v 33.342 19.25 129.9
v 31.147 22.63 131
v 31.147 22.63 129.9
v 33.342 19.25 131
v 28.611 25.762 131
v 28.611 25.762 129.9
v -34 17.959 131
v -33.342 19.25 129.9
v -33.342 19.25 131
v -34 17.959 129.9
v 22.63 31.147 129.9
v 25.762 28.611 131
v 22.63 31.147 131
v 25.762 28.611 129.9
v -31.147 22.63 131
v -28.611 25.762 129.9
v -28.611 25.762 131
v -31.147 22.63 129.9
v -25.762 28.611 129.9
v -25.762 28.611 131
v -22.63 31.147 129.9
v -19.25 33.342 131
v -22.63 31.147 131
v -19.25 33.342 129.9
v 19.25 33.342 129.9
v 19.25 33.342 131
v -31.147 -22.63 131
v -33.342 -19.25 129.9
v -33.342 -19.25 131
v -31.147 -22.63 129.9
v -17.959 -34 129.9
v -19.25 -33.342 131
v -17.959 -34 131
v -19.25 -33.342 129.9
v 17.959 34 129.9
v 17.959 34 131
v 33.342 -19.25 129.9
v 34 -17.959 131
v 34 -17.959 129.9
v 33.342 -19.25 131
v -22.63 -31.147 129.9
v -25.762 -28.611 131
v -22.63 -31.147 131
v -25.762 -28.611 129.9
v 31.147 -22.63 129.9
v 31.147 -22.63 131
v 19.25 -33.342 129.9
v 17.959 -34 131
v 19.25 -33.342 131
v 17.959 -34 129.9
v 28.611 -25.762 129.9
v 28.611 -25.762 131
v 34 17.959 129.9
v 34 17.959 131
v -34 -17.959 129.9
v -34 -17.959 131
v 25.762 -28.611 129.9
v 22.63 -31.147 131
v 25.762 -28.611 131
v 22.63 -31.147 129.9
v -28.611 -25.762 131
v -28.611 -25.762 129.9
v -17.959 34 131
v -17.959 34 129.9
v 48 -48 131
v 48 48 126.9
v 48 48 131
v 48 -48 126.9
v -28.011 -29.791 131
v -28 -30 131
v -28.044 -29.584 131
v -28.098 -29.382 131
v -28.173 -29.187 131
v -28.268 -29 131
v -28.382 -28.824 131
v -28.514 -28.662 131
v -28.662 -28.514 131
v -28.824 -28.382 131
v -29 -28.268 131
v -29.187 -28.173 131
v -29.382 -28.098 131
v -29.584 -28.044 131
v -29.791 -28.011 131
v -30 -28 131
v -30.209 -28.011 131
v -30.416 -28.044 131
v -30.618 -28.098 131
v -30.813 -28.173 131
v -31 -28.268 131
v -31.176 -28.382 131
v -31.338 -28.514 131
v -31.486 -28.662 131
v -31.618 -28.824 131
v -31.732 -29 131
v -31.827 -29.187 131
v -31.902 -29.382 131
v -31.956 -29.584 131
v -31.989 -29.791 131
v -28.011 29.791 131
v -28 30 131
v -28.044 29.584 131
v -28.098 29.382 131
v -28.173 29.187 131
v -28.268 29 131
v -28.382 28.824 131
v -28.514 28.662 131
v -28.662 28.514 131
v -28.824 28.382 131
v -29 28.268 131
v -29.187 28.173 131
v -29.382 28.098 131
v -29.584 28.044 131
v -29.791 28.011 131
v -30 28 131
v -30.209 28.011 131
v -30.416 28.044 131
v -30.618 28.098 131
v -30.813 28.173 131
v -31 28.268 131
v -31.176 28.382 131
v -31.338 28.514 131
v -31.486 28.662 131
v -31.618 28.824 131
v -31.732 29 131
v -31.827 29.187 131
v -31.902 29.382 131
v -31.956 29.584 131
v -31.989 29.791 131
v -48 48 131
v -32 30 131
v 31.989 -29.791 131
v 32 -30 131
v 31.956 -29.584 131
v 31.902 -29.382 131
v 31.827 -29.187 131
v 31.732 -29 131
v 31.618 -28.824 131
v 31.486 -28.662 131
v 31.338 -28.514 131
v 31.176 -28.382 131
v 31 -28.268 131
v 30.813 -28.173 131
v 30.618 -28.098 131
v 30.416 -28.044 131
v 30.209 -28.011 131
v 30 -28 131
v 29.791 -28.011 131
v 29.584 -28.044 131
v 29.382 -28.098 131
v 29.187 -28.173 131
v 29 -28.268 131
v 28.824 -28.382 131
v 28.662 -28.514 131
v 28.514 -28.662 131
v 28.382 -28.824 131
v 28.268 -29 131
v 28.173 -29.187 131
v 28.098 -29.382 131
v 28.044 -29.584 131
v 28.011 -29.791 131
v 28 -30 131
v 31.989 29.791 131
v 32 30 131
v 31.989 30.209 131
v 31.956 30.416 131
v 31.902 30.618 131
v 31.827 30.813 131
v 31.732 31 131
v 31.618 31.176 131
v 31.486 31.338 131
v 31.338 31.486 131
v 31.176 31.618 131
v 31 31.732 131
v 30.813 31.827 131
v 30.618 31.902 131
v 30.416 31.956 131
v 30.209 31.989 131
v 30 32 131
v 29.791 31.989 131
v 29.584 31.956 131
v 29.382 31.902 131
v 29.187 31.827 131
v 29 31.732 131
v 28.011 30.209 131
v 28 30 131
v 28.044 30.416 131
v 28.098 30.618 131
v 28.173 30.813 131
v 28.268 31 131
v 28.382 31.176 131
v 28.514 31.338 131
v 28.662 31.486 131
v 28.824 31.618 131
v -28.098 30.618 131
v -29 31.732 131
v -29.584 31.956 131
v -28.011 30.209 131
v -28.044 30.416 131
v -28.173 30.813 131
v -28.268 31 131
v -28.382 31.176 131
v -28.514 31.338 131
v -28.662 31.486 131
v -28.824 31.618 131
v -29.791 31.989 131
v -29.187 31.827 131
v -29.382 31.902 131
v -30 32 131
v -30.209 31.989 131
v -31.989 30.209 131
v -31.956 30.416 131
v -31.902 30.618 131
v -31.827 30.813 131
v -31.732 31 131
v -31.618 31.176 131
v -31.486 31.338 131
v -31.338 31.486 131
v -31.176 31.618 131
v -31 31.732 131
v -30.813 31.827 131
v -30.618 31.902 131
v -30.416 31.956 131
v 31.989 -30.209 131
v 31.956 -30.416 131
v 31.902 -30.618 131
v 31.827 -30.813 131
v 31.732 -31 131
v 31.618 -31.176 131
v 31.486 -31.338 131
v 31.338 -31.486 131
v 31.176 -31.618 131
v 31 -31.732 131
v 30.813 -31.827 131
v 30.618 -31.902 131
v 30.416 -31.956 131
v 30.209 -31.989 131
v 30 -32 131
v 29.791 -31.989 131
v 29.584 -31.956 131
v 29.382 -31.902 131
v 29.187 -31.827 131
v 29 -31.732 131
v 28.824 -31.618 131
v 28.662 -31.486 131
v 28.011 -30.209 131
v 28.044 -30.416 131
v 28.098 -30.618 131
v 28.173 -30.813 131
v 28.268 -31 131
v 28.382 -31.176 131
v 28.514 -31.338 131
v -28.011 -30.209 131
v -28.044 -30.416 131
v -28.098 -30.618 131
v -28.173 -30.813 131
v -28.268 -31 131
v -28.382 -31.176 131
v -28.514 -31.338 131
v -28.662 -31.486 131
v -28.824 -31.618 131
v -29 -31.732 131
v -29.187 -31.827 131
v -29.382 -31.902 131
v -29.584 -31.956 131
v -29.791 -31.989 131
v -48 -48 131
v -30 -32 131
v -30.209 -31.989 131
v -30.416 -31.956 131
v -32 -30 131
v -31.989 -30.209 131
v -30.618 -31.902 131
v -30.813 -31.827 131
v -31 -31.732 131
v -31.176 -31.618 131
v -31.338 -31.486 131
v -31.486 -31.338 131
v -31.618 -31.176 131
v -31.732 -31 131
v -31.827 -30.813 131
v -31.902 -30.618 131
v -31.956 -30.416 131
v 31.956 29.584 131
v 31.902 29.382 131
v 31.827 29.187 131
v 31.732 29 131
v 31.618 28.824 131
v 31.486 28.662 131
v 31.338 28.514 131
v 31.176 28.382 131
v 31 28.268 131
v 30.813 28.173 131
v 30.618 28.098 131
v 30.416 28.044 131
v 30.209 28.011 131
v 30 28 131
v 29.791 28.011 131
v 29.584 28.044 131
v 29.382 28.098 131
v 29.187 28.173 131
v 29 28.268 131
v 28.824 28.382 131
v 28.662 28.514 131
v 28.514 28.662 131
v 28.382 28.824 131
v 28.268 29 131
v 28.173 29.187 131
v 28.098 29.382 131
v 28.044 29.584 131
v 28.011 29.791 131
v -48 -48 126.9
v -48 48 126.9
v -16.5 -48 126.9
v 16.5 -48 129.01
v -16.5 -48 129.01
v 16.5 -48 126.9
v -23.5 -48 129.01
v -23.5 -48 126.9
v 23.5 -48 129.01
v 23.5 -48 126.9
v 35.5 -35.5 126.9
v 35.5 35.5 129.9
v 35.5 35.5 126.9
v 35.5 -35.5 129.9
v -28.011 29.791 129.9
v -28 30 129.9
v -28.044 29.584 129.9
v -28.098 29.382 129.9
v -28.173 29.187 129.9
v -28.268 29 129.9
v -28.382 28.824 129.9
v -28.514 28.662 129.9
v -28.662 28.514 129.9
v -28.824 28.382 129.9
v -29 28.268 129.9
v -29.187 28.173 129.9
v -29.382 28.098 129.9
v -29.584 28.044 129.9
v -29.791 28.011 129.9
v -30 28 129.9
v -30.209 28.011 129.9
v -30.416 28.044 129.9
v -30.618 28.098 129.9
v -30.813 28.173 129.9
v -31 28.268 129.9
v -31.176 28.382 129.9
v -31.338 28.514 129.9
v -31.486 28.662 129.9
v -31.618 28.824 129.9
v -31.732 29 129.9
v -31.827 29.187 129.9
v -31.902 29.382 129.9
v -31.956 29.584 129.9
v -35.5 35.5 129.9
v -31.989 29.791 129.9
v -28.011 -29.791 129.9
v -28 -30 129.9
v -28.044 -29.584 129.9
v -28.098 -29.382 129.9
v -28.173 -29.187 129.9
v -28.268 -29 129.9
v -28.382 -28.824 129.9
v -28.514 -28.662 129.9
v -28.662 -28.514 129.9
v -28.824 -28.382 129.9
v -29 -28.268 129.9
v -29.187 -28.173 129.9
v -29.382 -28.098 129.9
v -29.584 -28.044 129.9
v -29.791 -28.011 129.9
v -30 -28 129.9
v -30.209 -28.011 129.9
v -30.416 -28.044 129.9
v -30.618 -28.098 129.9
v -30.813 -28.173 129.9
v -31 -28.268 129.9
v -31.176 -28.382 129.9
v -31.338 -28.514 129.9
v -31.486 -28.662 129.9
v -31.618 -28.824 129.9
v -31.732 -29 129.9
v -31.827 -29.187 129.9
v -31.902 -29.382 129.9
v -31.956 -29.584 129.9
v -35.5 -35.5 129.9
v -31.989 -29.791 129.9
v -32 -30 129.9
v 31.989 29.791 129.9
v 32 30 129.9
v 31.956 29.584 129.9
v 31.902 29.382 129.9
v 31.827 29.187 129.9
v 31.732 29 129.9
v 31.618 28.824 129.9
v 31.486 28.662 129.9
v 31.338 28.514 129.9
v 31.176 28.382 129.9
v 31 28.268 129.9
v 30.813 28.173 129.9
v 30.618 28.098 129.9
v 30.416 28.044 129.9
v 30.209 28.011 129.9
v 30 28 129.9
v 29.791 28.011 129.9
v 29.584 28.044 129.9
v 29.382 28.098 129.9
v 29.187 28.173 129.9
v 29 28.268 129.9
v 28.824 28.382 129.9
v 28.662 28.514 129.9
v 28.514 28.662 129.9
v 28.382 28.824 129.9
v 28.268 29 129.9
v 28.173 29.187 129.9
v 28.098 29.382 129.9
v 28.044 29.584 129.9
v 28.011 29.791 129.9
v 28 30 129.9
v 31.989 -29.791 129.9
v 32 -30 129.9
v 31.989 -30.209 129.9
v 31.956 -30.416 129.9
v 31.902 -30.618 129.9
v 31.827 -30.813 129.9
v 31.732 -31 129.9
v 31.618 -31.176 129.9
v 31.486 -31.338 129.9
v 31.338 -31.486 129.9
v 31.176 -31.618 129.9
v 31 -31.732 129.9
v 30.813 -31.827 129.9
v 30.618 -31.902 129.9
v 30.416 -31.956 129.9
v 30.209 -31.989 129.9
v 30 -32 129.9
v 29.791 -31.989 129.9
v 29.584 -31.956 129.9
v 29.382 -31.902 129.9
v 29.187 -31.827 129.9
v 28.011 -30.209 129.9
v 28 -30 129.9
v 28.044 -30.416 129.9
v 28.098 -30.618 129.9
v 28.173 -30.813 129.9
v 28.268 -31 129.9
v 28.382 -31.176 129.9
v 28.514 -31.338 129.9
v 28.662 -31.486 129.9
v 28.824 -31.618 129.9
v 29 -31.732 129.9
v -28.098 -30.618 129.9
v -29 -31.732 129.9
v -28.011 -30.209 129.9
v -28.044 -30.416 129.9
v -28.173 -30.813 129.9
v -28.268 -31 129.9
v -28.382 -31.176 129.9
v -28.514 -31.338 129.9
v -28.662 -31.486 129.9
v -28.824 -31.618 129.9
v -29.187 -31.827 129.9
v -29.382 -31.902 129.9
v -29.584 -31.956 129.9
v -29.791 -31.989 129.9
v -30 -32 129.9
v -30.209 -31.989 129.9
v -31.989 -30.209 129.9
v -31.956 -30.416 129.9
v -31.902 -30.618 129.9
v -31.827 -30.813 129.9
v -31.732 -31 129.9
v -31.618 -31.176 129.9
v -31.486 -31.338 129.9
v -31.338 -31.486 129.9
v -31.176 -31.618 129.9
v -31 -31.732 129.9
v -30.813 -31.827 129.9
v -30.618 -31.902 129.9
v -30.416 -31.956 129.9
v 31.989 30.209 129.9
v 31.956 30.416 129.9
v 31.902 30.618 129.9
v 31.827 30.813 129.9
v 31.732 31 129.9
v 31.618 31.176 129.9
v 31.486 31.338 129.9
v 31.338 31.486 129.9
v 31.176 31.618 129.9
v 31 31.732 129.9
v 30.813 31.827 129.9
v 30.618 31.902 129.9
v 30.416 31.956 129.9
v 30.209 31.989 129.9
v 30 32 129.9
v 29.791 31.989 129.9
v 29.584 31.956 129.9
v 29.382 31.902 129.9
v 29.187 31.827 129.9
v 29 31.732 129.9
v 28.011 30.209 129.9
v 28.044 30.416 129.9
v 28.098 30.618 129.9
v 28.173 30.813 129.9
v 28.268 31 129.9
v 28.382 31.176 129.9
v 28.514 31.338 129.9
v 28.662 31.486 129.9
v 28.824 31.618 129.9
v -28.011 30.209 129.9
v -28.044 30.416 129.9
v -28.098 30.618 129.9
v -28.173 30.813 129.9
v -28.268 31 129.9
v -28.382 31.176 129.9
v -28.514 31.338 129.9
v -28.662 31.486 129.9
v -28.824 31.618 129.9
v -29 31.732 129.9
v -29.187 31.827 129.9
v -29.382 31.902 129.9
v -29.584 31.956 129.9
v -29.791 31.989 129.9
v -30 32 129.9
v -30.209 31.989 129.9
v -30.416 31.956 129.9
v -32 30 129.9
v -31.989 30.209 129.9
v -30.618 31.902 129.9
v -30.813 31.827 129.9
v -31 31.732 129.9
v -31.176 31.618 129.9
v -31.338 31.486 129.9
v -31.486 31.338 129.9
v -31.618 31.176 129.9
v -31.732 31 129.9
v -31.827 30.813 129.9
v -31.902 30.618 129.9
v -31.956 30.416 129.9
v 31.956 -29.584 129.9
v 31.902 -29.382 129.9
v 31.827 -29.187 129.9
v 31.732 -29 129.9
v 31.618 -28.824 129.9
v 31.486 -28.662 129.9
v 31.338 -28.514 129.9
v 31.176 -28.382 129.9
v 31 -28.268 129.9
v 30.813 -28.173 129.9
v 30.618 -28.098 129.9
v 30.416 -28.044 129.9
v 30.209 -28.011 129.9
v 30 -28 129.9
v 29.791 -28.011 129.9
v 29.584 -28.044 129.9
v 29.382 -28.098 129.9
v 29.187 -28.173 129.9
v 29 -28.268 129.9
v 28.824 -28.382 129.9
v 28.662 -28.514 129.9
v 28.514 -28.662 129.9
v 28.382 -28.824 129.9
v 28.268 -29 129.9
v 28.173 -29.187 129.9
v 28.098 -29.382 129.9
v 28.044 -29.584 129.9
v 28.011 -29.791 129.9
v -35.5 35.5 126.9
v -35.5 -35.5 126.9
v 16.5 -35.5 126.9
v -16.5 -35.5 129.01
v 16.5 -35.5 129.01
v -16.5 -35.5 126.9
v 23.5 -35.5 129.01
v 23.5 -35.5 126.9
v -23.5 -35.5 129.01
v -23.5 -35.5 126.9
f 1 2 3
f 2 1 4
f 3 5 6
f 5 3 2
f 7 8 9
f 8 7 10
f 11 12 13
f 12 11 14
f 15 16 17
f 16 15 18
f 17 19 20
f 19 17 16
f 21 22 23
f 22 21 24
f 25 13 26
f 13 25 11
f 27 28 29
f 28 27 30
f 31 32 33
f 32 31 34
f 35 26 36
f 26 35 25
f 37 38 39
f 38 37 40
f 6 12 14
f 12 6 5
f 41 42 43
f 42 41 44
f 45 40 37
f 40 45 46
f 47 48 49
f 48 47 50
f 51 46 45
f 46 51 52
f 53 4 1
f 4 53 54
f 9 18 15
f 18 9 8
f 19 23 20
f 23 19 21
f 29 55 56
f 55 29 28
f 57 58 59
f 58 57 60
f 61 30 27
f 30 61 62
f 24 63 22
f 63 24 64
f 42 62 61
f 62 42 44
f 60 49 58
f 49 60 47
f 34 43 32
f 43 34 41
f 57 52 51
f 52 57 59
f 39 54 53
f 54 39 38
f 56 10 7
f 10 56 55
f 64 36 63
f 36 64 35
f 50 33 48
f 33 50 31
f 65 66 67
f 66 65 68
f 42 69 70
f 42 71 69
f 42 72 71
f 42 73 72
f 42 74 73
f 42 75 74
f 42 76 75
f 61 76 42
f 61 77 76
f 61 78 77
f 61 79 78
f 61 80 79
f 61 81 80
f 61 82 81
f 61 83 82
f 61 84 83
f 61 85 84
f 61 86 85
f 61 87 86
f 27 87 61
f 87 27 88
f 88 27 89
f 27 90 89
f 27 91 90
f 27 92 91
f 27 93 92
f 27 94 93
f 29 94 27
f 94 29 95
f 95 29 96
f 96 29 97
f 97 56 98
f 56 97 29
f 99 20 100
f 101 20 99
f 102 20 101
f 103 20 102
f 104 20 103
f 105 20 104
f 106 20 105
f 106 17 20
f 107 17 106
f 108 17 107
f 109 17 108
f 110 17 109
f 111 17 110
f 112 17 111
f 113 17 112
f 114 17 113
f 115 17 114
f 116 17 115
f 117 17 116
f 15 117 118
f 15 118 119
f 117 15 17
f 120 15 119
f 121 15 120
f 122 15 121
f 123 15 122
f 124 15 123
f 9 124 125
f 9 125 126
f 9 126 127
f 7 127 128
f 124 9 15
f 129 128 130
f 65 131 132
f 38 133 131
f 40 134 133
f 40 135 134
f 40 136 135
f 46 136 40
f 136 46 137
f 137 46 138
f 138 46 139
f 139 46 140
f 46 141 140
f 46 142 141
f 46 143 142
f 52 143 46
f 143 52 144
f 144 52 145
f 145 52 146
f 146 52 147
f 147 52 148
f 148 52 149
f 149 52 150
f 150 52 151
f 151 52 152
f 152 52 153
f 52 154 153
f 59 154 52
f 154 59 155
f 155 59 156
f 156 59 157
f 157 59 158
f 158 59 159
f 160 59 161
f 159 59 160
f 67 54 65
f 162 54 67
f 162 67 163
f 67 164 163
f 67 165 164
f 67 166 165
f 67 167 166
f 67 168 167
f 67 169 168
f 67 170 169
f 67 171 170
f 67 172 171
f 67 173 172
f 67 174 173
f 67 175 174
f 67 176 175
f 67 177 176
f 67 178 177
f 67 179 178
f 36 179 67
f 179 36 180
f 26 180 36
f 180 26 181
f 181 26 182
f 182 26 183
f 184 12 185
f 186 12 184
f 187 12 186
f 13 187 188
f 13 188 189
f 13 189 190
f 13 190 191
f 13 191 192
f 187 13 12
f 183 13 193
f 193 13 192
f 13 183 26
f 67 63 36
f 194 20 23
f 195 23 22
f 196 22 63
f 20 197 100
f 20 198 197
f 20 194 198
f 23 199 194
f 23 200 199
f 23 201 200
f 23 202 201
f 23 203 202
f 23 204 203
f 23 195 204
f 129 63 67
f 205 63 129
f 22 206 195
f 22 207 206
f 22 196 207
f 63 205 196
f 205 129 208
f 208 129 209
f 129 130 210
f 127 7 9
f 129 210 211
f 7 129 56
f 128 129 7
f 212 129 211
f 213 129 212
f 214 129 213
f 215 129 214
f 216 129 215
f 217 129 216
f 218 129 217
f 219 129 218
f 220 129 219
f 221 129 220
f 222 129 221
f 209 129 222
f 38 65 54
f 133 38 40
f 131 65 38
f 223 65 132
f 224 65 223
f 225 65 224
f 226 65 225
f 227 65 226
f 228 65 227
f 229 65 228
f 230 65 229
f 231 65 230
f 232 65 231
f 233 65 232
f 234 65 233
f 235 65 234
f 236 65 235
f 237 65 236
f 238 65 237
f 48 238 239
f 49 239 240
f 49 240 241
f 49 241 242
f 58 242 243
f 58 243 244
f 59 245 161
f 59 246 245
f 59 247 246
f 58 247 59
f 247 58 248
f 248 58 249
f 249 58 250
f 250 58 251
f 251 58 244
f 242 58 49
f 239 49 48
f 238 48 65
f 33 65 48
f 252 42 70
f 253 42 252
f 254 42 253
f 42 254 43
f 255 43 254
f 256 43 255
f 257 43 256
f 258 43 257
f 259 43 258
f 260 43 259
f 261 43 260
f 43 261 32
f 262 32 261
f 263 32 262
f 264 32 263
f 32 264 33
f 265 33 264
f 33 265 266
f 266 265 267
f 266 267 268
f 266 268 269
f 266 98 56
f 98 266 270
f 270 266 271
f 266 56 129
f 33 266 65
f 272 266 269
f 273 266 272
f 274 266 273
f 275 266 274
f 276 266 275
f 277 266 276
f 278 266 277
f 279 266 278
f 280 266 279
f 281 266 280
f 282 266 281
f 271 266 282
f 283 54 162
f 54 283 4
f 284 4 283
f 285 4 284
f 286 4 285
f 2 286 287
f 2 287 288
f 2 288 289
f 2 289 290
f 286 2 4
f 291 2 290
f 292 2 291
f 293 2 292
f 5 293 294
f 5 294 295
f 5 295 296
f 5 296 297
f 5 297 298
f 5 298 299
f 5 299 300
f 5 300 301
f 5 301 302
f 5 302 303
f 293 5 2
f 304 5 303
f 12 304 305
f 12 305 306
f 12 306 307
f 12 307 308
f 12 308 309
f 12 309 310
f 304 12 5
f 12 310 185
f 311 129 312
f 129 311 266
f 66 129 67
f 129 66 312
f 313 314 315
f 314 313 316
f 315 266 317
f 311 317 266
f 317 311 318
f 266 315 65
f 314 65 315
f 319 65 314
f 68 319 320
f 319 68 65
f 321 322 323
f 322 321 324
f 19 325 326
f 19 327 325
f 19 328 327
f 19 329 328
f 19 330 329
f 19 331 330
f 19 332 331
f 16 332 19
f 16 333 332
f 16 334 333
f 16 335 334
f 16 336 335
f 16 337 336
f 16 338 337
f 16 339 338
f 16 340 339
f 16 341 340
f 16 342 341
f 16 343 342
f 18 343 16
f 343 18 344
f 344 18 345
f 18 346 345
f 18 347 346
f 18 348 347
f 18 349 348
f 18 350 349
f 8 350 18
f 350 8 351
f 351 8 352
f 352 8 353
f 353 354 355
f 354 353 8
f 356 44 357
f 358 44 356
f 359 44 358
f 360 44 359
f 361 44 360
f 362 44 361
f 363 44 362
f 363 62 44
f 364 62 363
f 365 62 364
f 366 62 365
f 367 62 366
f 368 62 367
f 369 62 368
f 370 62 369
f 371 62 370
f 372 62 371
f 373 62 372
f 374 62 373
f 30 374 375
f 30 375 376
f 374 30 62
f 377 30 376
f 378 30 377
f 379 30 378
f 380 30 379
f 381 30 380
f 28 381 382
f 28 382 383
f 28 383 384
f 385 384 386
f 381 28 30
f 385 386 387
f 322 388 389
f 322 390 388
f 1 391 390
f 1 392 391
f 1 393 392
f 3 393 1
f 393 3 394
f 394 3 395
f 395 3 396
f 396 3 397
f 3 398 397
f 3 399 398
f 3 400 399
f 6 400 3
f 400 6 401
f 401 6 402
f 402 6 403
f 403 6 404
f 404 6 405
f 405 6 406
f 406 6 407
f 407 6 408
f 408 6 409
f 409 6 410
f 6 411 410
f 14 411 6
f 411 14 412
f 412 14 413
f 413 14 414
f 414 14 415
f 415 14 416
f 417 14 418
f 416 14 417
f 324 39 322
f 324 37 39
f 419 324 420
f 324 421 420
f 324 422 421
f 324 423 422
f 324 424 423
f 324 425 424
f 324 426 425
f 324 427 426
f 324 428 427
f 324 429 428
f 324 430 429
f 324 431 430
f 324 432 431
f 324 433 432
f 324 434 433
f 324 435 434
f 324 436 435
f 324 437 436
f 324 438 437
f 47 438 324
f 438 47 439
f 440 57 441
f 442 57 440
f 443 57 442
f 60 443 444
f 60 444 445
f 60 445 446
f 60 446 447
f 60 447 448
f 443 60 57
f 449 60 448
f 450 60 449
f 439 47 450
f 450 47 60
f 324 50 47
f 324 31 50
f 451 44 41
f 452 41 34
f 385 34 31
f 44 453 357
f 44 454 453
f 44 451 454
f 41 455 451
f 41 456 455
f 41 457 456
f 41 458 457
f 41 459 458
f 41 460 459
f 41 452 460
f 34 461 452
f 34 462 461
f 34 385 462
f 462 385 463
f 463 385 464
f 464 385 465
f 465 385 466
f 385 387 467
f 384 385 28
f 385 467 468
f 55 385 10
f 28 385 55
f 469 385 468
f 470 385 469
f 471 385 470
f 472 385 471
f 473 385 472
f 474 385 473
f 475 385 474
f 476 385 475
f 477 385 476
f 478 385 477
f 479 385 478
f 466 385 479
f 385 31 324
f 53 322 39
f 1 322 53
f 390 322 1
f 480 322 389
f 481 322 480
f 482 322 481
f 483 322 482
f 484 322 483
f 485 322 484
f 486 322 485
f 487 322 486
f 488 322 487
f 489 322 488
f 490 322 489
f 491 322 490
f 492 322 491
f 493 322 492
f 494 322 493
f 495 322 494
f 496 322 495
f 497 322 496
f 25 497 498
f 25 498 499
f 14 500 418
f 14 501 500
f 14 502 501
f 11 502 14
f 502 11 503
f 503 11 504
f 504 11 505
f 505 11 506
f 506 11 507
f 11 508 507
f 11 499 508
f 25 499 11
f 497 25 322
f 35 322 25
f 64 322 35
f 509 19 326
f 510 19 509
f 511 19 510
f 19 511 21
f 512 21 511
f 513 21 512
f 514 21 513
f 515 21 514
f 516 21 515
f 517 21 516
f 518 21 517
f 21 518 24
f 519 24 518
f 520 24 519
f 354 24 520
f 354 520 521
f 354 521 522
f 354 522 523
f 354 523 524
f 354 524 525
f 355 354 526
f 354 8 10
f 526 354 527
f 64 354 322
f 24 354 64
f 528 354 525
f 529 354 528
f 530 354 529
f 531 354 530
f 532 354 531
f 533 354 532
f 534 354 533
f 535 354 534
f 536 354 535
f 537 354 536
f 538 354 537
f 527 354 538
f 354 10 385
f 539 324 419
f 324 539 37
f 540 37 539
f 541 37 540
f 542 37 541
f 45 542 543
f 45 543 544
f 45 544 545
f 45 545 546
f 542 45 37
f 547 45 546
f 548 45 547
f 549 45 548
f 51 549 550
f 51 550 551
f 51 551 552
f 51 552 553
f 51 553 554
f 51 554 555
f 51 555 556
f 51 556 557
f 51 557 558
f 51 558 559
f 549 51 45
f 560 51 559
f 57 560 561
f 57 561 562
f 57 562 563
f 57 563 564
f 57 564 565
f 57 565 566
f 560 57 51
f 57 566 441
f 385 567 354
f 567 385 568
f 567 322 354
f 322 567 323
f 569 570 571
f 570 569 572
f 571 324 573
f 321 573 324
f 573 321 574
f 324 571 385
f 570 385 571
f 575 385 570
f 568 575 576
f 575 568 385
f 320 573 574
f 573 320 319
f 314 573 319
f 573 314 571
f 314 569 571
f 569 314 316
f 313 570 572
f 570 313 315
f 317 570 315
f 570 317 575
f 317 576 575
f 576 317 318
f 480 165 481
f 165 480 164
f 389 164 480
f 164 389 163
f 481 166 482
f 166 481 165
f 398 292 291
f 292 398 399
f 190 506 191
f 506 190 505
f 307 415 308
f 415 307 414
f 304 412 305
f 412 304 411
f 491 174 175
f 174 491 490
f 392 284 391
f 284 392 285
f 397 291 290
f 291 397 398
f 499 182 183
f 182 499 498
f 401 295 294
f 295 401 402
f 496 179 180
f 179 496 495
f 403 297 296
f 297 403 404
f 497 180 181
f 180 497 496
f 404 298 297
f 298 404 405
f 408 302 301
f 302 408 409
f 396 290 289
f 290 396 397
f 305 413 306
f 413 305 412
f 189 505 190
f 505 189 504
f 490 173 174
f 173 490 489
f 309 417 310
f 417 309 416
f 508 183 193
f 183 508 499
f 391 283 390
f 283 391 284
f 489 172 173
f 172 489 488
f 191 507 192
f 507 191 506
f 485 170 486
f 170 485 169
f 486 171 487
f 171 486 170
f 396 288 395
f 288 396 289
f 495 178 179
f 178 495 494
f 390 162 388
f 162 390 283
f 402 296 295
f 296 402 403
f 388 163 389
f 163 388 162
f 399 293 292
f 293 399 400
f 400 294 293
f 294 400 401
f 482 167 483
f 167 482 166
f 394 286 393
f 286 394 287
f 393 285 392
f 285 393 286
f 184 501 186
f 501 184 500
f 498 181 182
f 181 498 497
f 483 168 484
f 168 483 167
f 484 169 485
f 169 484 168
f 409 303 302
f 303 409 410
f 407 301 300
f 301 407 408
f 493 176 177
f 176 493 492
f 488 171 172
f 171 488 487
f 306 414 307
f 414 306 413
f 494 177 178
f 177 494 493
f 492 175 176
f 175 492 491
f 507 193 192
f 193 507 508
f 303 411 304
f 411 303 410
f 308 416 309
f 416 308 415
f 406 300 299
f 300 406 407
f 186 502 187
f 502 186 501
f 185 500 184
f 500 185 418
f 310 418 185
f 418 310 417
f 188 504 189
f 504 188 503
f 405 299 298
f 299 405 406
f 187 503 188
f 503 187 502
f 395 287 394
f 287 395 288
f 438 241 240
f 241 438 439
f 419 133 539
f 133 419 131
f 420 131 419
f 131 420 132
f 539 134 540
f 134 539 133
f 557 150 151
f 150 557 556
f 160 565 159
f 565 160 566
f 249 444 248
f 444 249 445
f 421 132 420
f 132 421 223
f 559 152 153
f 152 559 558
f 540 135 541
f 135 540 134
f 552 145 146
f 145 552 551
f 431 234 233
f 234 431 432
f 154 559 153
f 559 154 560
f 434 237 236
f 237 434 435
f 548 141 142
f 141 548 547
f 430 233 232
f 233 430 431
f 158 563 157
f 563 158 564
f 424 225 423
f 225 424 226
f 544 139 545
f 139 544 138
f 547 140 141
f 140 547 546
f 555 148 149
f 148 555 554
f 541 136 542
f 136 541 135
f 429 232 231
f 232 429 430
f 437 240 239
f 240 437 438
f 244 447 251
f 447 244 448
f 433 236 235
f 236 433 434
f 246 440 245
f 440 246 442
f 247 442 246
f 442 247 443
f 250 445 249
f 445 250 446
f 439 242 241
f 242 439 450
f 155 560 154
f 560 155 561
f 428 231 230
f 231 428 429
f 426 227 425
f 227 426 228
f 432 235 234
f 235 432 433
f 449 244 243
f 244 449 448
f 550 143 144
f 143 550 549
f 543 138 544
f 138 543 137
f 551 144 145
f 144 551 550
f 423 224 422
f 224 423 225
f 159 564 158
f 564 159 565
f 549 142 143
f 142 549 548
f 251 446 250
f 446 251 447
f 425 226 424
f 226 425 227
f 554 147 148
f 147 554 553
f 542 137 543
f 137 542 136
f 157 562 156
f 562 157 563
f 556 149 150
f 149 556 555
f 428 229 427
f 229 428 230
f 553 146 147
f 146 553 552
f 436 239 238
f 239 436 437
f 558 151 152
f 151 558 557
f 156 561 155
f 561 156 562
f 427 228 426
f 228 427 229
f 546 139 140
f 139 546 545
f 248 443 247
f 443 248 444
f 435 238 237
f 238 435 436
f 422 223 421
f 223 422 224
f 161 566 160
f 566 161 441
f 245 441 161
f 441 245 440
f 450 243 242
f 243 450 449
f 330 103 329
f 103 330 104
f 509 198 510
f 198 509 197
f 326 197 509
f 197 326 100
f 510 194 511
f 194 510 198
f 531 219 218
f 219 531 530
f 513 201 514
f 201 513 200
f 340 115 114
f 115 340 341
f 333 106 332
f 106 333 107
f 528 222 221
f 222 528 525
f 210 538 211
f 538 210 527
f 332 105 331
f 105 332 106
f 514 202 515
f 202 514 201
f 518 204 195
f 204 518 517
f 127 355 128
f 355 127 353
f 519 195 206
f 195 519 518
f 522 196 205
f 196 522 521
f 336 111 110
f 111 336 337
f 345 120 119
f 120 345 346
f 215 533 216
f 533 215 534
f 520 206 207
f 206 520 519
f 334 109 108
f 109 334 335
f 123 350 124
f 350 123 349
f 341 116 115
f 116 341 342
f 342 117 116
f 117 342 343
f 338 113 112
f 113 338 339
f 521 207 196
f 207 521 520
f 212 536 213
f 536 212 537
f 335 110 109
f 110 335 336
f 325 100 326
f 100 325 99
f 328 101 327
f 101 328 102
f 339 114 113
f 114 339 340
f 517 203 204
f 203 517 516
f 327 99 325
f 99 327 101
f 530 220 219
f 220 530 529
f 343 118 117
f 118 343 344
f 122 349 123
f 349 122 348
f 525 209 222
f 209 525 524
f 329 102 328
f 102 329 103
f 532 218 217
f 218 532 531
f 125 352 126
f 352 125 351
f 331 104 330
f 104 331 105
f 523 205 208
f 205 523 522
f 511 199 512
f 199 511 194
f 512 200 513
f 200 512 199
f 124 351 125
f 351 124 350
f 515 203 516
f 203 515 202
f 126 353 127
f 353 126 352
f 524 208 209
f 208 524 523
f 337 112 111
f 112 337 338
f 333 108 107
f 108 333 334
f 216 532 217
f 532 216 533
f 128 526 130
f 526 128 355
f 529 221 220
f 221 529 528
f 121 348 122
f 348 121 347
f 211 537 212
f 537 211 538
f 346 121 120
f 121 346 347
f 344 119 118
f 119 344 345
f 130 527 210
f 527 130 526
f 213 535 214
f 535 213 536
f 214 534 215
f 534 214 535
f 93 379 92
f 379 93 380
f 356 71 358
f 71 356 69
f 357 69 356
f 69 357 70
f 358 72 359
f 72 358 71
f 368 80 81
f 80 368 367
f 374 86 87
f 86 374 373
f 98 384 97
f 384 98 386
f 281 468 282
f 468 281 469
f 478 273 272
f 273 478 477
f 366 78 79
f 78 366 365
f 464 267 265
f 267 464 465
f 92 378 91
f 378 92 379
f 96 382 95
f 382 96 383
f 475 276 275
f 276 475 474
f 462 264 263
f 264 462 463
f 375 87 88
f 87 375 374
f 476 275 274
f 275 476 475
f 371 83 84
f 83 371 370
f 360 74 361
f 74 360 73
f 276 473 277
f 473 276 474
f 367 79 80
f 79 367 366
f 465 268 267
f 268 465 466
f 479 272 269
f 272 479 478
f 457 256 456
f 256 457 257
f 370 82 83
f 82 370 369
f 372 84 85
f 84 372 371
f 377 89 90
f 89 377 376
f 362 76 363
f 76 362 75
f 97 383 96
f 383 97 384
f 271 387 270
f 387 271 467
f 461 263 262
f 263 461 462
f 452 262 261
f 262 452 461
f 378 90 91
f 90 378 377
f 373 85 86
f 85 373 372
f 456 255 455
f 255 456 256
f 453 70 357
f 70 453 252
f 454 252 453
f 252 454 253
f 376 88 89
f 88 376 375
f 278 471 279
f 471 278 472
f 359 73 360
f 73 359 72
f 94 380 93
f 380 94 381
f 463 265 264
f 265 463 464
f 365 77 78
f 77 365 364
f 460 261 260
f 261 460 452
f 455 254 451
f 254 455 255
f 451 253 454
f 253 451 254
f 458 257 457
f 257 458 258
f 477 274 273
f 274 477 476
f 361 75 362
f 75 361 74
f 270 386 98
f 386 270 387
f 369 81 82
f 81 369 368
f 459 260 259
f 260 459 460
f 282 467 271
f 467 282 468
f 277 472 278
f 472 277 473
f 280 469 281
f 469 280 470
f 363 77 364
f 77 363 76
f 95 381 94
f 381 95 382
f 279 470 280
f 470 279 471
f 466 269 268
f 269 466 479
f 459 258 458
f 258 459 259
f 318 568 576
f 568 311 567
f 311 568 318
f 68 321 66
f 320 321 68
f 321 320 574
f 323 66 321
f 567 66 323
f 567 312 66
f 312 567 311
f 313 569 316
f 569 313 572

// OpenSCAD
$fn=60;

// Vegetables
module filter (){
        union(){
            // Base
            // NOTE:  These measurements are tight.
            color("blue") translate([0,0,06.5/2])cube([131,112,06.5],center=true);
            
            // Pleats
            // NOTE:  The X/Y measurements are loose.
            //        The z   meassurement is  tight.
            color("white")translate([0,0,21.0/2])cube([117,101,21.0],center=true);
        };
};
;
module pressureFitting() {
    
    color("blue")
    translate([0,0,21])
    cylinder(h=7,d=4.5);
    
    color("gray")
    translate([0,0,14])
    cylinder(h=7,d=4.5);
    
    color("red")
    translate([0,0,7])
    cylinder(h=7,d=4.5);
    
    color("black")
    cylinder(h=7,d=4.5);
    
    
};
;
module countersinkWasher(){
    cylinder(h=10,d=8);
};
;
module countersinkNumber6Nut(){
    translate([0,0,4.7])
    cylinder(d=10,h=10,$fn=6);  // <-- Hole wide enough to encompass entire nut
    cylinder(d=7.5,h=10,$fn=6); // <-- Hole slightly smaller than nut to ensure it melts the sides
};
;
module countersinkNumber6Head(){
    cylinder(h=10,d=7);
};
;
module countersinkNumber6Washer(){
    cylinder(d=11,h=20);
};
;
module shaftNumber6(){
    cylinder(d=4,h=14);
};
;
module shaftNumber6wide(){
    cylinder(d=5,h=14);
};
;

module basePlate2(){
        union(){
            difference() {
                translate([0,0,15])cube([140,140,30],center=true);
                
                // Center Hole
                translate([0,0,20])cube([134-14*2,116-14*2,30],center=true);
                
                // Filter
                translate([0,0,21])rotate([180,0,0])
                minkowski() {
                    filter();
                    
                    // Widen X & Y, but not Z
                    cube([1,1,0.1],center=true);
                };
                ;
                
                // Pressure Plate
                minkowski() {
                    pressurePlateSolid();
                    
                    // This provides 3mm of empty space to squish the blue rubber filter
                    cube([1,1,3],center=true);
                };
                
                // Chassis Mounting Holes
                color("red")  translate([+124.5/2,+124.5/2,-1])resize([0,0,40])pressureFitting();
                color("green")translate([+124.5/2,-124.5/2,-1])resize([0,0,40])pressureFitting();
                color("blue") translate([-124.5/2,+124.5/2,-1])resize([0,0,40])pressureFitting();
                color("pink") translate([-124.5/2,-124.5/2,-1])resize([0,0,40])pressureFitting();
            };
        };
};
;
module pressurePlateSolid(){
        translate([0,0,8])
        union() {
            color("green")  // runs along y-axis
            cube([114,136,16],center=true);
            
            color("orange") // runs along x-axis
            cube([136,114,16],center=true);
        };
};
;
module pressurePlate(){
    translate([0,0,8])
    union() {

        difference() {
            color("blue")
            translate([0,0,-8])
            pressurePlateSolid();
            
            // Center Hole
            color("white")
            cube([117,101,20],center=true);
            
            color("purple")
            minkowski() {
                translate([0,0,13])
                rotate([180,0,0])
                filter();
                
                // Widen X & Y, but not Z
                cube([1,1,0.1],center=true);
            };
            
        };
    };
};
;
module fanMount(fanSize=80){
    // Constants
    fanHeight                  =  38;
    fanBoxHeight               =  fanHeight-3; // Subtract 3mm 
    pyramidHeightInner         =  25;
    pyramidHeightOuter         =  pyramidHeightInner;

    // Calculated Parameters
    fanWidth   = fanSize;
    bladeWidth = fanWidth - 2;

    translate([0,0,0.5])
    union() {
        // Fan Box
        rotate(rotateFanBox(fanSize))
        translate([0,0,pyramidHeightInner+10+fanBoxHeight/2-1])
        union() {
            difference() {
                // Outside
                cube([fanBoxWidth(fanSize),fanBoxWidth(fanSize),fanBoxHeight],center=true);
                
                // Inside
                translate([0,0,-0.1])
                cube([fanWidth+1,fanWidth+1,fanBoxHeight+2],center=true);
                
                // Hole For Wire
                // Fans have wires in different locations, so multiple holes
                translate([+(fanWidth/2-15),-53,5.01])
                cube([7,60,fanBoxHeight-10],center=true);
                
                // Hole For Wire
                // Fans have wires in different locations, so multiple holes
                translate([-(fanWidth/2-15),-53,5.01])
                cube([7,60,fanBoxHeight-10],center=true);
            };
            
        };
        ;
        

        // Round Air Shaft
        rotate(a=rotateFanBox(fanSize))
        translate([0,0,pyramidHeightInner+4])
        union() {
            difference() {
                color("blue")
                //translate([0,0,2])
                cube([fanBoxWidth(fanSize),fanBoxWidth(fanSize),10],center=true);
                FanHole(fanSize);
                //cylinder(d=bladeWidth,h=20,center=true);
                
                // Fan Box Mounting Holes (Variable fan size)
                X3 = fanMountingHoleDistance_(fanSize)/2;
                Y3 = fanMountingHoleDistance_(fanSize)/2;
                Z3 = -1;
                
                color("pink")     translate([+X3,+Y3,Z3])countersinkNumber6Nut();
                color("seagreen") translate([+X3,-Y3,Z3])countersinkNumber6Nut();
                color("lightblue")translate([-X3,+Y3,Z3])countersinkNumber6Nut();
                color("gray")     translate([-X3,-Y3,Z3])countersinkNumber6Nut();
                
                // Fan Box Screw Shafts (Variable fan size)
                X2 = fanMountingHoleDistance_(fanSize)/2;
                Y2 = fanMountingHoleDistance_(fanSize)/2;
                Z2 = -10.99;
                //Z2 = -12.99;
                color("pink")     translate([+X2,+Y2,Z2])shaftNumber6wide();
                color("seagreen") translate([+X2,-Y2,Z2])shaftNumber6wide();
                color("lightblue")translate([-X2,+Y2,Z2])shaftNumber6wide();
                color("gray")     translate([-X2,-Y2,Z2])shaftNumber6wide();
            };
        };
        ;
        
        // Pyramid
        difference() {
            // Outside
            hull() {
                // Top
                rotate(a=rotateFanBox(fanSize))
                translate([0,0,pyramidHeightOuter-2])
                cube([fanBoxWidth(fanSize),fanBoxWidth(fanSize),2],center=true);
                
                // Base
                cube([140,140,1],center=true);
            };
            ;
            // Hollow Inside
            hull () {
                // Top
                rotate(rotateFanBox(fanSize))
                translate([0,0,pyramidHeightOuter-1])
                //cylinder(d=bladeWidth,h=0.01,center=true);
                FanHole(fanSize,blobHeight1=0.1);
                
                // Bottom
                translate([0,0,-0.1])
                cube([134-14*2,116-14*2,1],center=true);
            };
            ;
            
            // Remove visual artifacts at boundary 
            //where pyramid and air shaft meet
            *translate([0,0,pyramidHeightOuter-1])
            cylinder(d=bladeWidth,h=5,center=true);
            
            
            // Chassis Mounting Holes (140mm fan size)
            X1 = fanMountingHoleDistance_(140)/2;
            Y1 = fanMountingHoleDistance_(140)/2;

            color("red")      translate([+X1,+Y1,-2])pressureFitting();  
            color("pink")     translate([+X1,+Y1,3])countersinkNumber6Washer();
            
            color("green")    translate([+X1,-Y1,-2])pressureFitting();
            color("seagreen") translate([+X1,-Y1,3])countersinkNumber6Washer();
            
            color("blue")     translate([-X1,+Y1,-2])pressureFitting();
            color("lightblue")translate([-X1,+Y1,3])countersinkNumber6Washer();
            
            color("silver")   translate([-X1,-Y1,-2])pressureFitting();
            color("gray")     translate([-X1,-Y1,3])countersinkNumber6Washer();

            rotate(a=rotateFanBox(fanSize))
            union(){    
                // Fan Box Screw Shafts (Variable fan size)
                X2 = fanMountingHoleDistance_(fanSize)/2;
                Y2 = fanMountingHoleDistance_(fanSize)/2;
                //Z2 = 22;
                Z2 = 19;
                color("pink")     translate([+X2,+Y2,Z2])shaftNumber6wide();
                color("seagreen") translate([+X2,-Y2,Z2])shaftNumber6wide();
                color("lightblue")translate([-X2,+Y2,Z2])shaftNumber6wide();
                color("gray")     translate([-X2,-Y2,Z2])shaftNumber6wide();
            };
        };
    };
    ;
}
;
function fanMountingHoleDistance_(fanDiameter) =
        (fanDiameter == 140) ? 124.5:
        (fanDiameter == 120) ? 105.0:
        (fanDiameter ==  92) ?  82.5:
        (fanDiameter ==  80) ?  71.5:
        (fanDiameter ==  70) ?  60.0:10;
;
function fanBoxWidth(fanDiameter) =
        (fanDiameter == 120) ? 122:
        (fanDiameter ==  92) ? 96:
        (fanDiameter ==  80) ? 96:
        (fanDiameter ==  70) ? 96:10;
;
function rotateFanBox(fanDiameter) =
        (fanDiameter == 120) ? [0,0,6]:       // Six degrees of rotation to make room for washers bolts.
        (fanDiameter ==  92) ? [0,0,0]:       // Disable rotation
        (fanDiameter ==  80) ? [0,0,0]:       // Disable rotation
        (fanDiameter ==  70) ? [0,0,0]:[0,0,0];     // Disable rotation
;
module fanCover(fanSize=80){
    // Constants
    fanHeight                  =  38;
    fanBoxHeight               =  fanHeight;
    pyramidHeightInner         =  25;
    pyramidHeightOuter         =  pyramidHeightInner;

    // Calculated Parameters
    fanWidth   = fanSize;
    bladeWidth = fanWidth - 2;

    rotate(a=rotateFanBox(fanSize))    
    union() {
        // Fan Box
        translate([0,0,0])
        union() {
            difference() {
                // Outside
                translate([0,0,1])
                cube([fanBoxWidth(fanSize),fanBoxWidth(fanSize),fanBoxHeight+2],center=true);
                
                // Inside
                translate([0,0,-0.1])
                cube([fanWidth+1,fanWidth+1,fanBoxHeight+2],center=true);
                
                // Hole For Wire
                // Fans have wires in different locations, so multiple holes
                translate([+(fanWidth/2-15),-53,5.01])
                cube([7,60,fanBoxHeight-10],center=true);
                
                // Hole For Wire
                // Fans have wires in different locations, so multiple holes
                translate([-(fanWidth/2-15),-53,5.01])
                cube([7,60,fanBoxHeight-10],center=true);

                // Exhaust Hole
                translate([0,0,20])
                FanHole(fanSize=fanSize,blobHeight1=20);

                // Fan Box Screw Shafts (Variable fan size)
                X2 = fanMountingHoleDistance_(fanSize)/2;
                Y2 = fanMountingHoleDistance_(fanSize)/2;
                Z2 = 10;
                color("pink")     translate([+X2,+Y2,Z2])shaftNumber6();
                color("seagreen") translate([+X2,-Y2,Z2])shaftNumber6();
                color("lightblue")translate([-X2,+Y2,Z2])shaftNumber6();
                color("gray")     translate([-X2,-Y2,Z2])shaftNumber6();


                // The Fan Exhaust Cover
                    // If a fanmount failed to finish printing, but it got part of the way up the 38mm thickness of the fan, follow these instructions.
                    // 1. Pull the semi-printed object off the metal print bed
                    // 2. Put the fan into the fanmount
                    // 3. Use your calipers to measure how much of the fan is uncovered.  Example:  15.52mm
                    // 4. Put that value into the Z-value in line AAAA (below) like this: [0,0,15.52]

                    // If the fanmount printed OK, leave AAAA at [0,0,3]
                color("orange")
                rotate([180,0,0])     // <-- Rotated so translate (directly below) now works inverted
                translate([0,0,3])    // <-- AAAA
                translate([0,0,100 - (fanBoxHeight+1.8)/2]) // Do Not Change.  Ever. 
                cube([200,200,200],center=true);
            };
        };
        ;
    };
    ;
}
;
module FanHole(fanSize,blobHeight1=20) {
    exitDiameter = 
        (fanSize == 120) ? 125:
        (fanSize ==  92) ? 103:
        (fanSize ==  80) ? 89:
        (fanSize ==  70) ? 77:10;

    color("gray")
    intersection() {
        cylinder(d=exitDiameter,h=blobHeight1,center=true);
        cube([fanSize-2,fanSize-2,blobHeight1 + 0.02],center=true);
    };
};

fanSize_ = 70;  // Acceptable Values: 120, 92, 80, 70
difference() {
    union() {
        // Covers the egress side of the fan
        translate([0,0,110]) fanCover(fanSize_);

        // Adding a Gap Filler Under The Fan Cover
        // Not Needed For Most Prints, so Leave Disabled
        *translate([0,0,126.38])
        render()
        intersection() {
            linear_extrude(3.52) projection(cut = false) fanCover(fanBoxWidth(fanSize));
            cube([fanSize_,fanSize_,100],center=true);
        };    

        *translate([0,0,30])fanMount(fanSize_);  
        *pressurePlate();
        *basePlate2();
        
        *translate([0,0,21])rotate([180,0,0])filter();
    };

    // Countersink Washers
        translate([+50,+124.5/2,-0.01])countersinkWasher();
        translate([+00,+124.5/2,-0.01])countersinkWasher();
        translate([-50,+124.5/2,-0.01])countersinkWasher();
        translate([+50,-124.5/2,-0.01])countersinkWasher();
        translate([+00,-124.5/2,-0.01])countersinkWasher();
        translate([-50,-124.5/2,-0.01])countersinkWasher();
    
    // Pressure Fitting Mounting Holes
        translate([+50,+124.5/2,0])pressureFitting();
        translate([+00,+124.5/2,0])pressureFitting();
        translate([-50,+124.5/2,0])pressureFitting();
        translate([+50,-124.5/2,0])pressureFitting();
        translate([+00,-124.5/2,0])pressureFitting();
        translate([-50,-124.5/2,0])pressureFitting();    
};

*translate([0,0,21])rotate([180,0,0])filter();


// 2-Inch #6 Bolt depth gauge
// Four of these bolts secure the fan in the fan box.
*translate([36,36,52])
cylinder(d=2,h=51);

*color("black")
translate([0,50,12.7])
cube([20,20,16.6],center=true);
